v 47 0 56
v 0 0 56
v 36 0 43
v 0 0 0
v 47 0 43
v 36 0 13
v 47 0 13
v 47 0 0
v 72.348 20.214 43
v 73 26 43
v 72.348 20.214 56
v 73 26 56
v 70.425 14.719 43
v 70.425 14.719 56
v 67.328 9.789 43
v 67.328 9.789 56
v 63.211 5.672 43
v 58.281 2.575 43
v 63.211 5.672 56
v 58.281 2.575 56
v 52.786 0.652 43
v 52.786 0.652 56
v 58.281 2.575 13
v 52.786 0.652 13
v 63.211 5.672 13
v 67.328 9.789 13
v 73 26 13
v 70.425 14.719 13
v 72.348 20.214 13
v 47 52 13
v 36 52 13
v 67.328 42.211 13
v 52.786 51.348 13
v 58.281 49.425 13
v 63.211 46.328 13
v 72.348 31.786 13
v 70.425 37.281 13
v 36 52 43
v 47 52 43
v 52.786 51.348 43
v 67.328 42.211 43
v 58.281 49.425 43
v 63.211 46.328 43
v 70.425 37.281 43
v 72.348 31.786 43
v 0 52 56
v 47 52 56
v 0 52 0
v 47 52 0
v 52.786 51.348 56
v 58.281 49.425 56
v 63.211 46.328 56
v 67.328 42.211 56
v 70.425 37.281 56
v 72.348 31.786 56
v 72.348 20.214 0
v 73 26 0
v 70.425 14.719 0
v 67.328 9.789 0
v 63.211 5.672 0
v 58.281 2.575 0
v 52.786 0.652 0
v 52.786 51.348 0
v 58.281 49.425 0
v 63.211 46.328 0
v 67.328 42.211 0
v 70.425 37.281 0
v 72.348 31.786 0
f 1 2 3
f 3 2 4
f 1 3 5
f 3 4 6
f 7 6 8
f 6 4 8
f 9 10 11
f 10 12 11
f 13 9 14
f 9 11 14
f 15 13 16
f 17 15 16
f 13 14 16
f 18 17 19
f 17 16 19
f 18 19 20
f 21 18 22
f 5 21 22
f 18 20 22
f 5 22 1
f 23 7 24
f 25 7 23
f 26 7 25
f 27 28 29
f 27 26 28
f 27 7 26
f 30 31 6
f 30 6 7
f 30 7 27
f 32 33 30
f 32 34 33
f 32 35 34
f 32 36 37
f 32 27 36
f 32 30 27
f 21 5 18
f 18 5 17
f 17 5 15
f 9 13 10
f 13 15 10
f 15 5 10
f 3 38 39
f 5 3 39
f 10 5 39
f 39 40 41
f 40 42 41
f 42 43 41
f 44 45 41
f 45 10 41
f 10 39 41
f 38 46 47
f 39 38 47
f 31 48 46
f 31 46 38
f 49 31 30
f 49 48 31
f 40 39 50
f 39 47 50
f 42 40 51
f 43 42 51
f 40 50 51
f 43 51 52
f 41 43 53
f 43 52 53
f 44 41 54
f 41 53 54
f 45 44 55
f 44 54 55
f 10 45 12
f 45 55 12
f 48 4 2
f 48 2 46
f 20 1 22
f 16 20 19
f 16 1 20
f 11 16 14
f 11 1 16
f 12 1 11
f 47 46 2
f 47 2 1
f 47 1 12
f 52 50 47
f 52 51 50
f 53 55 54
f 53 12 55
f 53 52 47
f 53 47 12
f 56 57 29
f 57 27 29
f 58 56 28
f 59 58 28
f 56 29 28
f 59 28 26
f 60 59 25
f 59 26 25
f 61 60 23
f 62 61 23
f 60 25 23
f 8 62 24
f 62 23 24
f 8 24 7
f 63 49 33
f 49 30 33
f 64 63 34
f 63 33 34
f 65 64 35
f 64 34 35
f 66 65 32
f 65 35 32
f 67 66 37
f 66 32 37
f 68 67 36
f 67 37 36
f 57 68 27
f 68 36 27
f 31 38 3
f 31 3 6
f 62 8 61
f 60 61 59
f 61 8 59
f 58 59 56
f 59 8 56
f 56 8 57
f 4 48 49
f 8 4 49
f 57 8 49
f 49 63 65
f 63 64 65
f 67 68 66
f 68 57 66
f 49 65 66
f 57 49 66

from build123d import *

# Parameters (mm, degrees)
IZIM1_W                     = 73
IZIM1_H                     = 52
Y_KSEKLIK_EKSTR_ZYON1_DEPTH = 56
IZIM2_W                     = 37
IZIM2_H                     = 30
KES_EKSTR_ZYON1_DEPTH       = 106.683489723
RADYUS1_R                   = 26
RADYUS2_R                   = 26
RADYUS3_R                   = 26
RADYUS5_R                   = 26


with BuildPart() as part:
    # Çizim1 → Yükseklik-Ekstrüzyon1 (new body)
    with BuildSketch(Plane.XY):
        with Locations((36.5, 26)):
            Rectangle(IZIM1_W, IZIM1_H)
    extrude(amount=Y_KSEKLIK_EKSTR_ZYON1_DEPTH)

    # Çizim2 → Kes-Ekstrüzyon1 (cut, through all)
    with BuildSketch(Plane(origin=(0, 52, 0), x_dir=(1, 0, 0), z_dir=(0, 1, 0))):
        with Locations((54.5, -28)):
            Rectangle(IZIM2_W, IZIM2_H)
    extrude(amount=-KES_EKSTR_ZYON1_DEPTH, mode=Mode.SUBTRACT)

    # Radyus1
    radyus1_edges = [part.edges().sort_by_distance(p)[0] for p in [
        (73, 52, 49.5),
    ]]
    fillet(radyus1_edges, radius=RADYUS1_R)

    # Radyus2
    radyus2_edges = [part.edges().sort_by_distance(p)[0] for p in [
        (73, 0, 49.5),
    ]]
    fillet(radyus2_edges, radius=RADYUS2_R - 0.0001)  # a hair under: the kernel refuses the full size

    # Radyus3
    radyus3_edges = [part.edges().sort_by_distance(p)[0] for p in [
        (73, 52, 6.5),
    ]]
    fillet(radyus3_edges, radius=RADYUS3_R)

    # Radyus5
    radyus5_edges = [part.edges().sort_by_distance(p)[0] for p in [
        (73, 0, 6.5),
    ]]
    fillet(radyus5_edges, radius=RADYUS5_R - 0.0001)  # a hair under: the kernel refuses the full size


solid = part.part
